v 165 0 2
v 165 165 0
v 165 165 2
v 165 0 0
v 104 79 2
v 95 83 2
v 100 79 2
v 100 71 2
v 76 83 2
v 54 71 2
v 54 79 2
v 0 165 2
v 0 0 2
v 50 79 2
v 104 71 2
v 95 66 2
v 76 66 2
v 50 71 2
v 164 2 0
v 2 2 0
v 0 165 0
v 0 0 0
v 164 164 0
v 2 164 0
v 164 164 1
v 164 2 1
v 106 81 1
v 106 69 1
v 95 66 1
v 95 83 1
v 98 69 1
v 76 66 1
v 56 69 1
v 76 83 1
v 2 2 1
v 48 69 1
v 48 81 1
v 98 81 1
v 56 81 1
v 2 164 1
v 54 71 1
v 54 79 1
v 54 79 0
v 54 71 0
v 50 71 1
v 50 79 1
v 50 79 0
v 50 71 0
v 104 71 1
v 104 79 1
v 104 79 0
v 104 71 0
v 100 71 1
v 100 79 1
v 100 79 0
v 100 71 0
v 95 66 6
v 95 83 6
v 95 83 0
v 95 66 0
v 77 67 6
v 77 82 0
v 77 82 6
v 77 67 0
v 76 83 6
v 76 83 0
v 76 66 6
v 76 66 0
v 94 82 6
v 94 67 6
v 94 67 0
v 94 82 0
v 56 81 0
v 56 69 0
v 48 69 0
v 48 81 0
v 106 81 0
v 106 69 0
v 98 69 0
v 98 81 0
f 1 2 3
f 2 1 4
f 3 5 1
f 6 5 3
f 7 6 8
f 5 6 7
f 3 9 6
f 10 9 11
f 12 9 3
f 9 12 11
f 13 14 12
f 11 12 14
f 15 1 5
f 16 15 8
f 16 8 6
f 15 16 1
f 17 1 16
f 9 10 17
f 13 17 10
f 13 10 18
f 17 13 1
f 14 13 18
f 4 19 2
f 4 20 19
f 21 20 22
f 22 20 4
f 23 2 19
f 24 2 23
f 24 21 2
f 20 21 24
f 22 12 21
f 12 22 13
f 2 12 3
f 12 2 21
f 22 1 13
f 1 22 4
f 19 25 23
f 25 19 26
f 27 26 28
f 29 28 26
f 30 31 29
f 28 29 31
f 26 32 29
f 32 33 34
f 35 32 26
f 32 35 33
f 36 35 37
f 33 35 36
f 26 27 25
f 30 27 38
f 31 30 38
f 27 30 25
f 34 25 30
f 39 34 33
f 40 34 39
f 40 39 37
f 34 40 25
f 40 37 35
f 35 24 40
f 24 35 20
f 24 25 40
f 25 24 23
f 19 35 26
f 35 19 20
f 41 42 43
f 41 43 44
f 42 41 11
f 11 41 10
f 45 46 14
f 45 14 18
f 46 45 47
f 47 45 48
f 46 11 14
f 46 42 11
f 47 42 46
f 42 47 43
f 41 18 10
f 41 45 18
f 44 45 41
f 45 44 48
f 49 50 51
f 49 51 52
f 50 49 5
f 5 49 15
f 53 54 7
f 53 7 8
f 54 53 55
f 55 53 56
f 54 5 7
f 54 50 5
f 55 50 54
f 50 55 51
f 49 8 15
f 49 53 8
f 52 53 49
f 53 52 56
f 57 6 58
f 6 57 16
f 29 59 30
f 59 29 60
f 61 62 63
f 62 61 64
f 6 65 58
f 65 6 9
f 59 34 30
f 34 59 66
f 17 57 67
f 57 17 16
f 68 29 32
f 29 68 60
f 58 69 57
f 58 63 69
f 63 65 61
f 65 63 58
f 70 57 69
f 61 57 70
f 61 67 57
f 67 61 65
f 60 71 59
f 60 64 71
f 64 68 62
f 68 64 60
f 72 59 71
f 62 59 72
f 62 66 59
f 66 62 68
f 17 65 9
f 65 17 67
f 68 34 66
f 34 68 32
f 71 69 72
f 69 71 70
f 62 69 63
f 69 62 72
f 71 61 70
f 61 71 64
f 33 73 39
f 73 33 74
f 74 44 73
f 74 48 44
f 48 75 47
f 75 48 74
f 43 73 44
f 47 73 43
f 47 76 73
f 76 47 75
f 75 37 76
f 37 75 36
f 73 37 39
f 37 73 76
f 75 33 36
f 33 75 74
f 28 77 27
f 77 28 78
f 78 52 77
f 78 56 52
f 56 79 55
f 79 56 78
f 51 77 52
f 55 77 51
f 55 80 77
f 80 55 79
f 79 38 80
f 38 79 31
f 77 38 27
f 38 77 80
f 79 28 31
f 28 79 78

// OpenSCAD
screwHoleY = 71;
screwHoleX = 50;

// Main square with holes.
difference() {
    cube([165, 165, 2]);
    translate([2, 2, 0])
    cube([162, 162, 1]);
    translate([screwHoleX, screwHoleY, 0])
    cube([4, 8, 4]); 
    translate([screwHoleX + 50, screwHoleY, 0])
    cube([4, 8, 4]);
    translate([screwHoleX + 27, screwHoleY - 5, 0])
    cube([18, 17, 4]); 
}

// Wiring hole
difference() {
    translate([screwHoleX + 26, screwHoleY - 5, 0])
    cube([19, 17, 6]);
    translate([screwHoleX + 27, screwHoleY - 4, 0])
    cube([17, 15, 6]);
}

// Top Screw Hole
difference() {
    translate([screwHoleX - 2, screwHoleY - 2, 0])
    cube([8, 12, 2]);
    translate([screwHoleX, screwHoleY, 0])
    cube([4, 8, 2]);
}

// Bottom Screw Hole
difference() {
    translate([screwHoleX + 48, screwHoleY - 2, 0])
    cube([8, 12, 2]);
    translate([screwHoleX + 50, screwHoleY, 0])
    cube([4, 8, 2]);
}
